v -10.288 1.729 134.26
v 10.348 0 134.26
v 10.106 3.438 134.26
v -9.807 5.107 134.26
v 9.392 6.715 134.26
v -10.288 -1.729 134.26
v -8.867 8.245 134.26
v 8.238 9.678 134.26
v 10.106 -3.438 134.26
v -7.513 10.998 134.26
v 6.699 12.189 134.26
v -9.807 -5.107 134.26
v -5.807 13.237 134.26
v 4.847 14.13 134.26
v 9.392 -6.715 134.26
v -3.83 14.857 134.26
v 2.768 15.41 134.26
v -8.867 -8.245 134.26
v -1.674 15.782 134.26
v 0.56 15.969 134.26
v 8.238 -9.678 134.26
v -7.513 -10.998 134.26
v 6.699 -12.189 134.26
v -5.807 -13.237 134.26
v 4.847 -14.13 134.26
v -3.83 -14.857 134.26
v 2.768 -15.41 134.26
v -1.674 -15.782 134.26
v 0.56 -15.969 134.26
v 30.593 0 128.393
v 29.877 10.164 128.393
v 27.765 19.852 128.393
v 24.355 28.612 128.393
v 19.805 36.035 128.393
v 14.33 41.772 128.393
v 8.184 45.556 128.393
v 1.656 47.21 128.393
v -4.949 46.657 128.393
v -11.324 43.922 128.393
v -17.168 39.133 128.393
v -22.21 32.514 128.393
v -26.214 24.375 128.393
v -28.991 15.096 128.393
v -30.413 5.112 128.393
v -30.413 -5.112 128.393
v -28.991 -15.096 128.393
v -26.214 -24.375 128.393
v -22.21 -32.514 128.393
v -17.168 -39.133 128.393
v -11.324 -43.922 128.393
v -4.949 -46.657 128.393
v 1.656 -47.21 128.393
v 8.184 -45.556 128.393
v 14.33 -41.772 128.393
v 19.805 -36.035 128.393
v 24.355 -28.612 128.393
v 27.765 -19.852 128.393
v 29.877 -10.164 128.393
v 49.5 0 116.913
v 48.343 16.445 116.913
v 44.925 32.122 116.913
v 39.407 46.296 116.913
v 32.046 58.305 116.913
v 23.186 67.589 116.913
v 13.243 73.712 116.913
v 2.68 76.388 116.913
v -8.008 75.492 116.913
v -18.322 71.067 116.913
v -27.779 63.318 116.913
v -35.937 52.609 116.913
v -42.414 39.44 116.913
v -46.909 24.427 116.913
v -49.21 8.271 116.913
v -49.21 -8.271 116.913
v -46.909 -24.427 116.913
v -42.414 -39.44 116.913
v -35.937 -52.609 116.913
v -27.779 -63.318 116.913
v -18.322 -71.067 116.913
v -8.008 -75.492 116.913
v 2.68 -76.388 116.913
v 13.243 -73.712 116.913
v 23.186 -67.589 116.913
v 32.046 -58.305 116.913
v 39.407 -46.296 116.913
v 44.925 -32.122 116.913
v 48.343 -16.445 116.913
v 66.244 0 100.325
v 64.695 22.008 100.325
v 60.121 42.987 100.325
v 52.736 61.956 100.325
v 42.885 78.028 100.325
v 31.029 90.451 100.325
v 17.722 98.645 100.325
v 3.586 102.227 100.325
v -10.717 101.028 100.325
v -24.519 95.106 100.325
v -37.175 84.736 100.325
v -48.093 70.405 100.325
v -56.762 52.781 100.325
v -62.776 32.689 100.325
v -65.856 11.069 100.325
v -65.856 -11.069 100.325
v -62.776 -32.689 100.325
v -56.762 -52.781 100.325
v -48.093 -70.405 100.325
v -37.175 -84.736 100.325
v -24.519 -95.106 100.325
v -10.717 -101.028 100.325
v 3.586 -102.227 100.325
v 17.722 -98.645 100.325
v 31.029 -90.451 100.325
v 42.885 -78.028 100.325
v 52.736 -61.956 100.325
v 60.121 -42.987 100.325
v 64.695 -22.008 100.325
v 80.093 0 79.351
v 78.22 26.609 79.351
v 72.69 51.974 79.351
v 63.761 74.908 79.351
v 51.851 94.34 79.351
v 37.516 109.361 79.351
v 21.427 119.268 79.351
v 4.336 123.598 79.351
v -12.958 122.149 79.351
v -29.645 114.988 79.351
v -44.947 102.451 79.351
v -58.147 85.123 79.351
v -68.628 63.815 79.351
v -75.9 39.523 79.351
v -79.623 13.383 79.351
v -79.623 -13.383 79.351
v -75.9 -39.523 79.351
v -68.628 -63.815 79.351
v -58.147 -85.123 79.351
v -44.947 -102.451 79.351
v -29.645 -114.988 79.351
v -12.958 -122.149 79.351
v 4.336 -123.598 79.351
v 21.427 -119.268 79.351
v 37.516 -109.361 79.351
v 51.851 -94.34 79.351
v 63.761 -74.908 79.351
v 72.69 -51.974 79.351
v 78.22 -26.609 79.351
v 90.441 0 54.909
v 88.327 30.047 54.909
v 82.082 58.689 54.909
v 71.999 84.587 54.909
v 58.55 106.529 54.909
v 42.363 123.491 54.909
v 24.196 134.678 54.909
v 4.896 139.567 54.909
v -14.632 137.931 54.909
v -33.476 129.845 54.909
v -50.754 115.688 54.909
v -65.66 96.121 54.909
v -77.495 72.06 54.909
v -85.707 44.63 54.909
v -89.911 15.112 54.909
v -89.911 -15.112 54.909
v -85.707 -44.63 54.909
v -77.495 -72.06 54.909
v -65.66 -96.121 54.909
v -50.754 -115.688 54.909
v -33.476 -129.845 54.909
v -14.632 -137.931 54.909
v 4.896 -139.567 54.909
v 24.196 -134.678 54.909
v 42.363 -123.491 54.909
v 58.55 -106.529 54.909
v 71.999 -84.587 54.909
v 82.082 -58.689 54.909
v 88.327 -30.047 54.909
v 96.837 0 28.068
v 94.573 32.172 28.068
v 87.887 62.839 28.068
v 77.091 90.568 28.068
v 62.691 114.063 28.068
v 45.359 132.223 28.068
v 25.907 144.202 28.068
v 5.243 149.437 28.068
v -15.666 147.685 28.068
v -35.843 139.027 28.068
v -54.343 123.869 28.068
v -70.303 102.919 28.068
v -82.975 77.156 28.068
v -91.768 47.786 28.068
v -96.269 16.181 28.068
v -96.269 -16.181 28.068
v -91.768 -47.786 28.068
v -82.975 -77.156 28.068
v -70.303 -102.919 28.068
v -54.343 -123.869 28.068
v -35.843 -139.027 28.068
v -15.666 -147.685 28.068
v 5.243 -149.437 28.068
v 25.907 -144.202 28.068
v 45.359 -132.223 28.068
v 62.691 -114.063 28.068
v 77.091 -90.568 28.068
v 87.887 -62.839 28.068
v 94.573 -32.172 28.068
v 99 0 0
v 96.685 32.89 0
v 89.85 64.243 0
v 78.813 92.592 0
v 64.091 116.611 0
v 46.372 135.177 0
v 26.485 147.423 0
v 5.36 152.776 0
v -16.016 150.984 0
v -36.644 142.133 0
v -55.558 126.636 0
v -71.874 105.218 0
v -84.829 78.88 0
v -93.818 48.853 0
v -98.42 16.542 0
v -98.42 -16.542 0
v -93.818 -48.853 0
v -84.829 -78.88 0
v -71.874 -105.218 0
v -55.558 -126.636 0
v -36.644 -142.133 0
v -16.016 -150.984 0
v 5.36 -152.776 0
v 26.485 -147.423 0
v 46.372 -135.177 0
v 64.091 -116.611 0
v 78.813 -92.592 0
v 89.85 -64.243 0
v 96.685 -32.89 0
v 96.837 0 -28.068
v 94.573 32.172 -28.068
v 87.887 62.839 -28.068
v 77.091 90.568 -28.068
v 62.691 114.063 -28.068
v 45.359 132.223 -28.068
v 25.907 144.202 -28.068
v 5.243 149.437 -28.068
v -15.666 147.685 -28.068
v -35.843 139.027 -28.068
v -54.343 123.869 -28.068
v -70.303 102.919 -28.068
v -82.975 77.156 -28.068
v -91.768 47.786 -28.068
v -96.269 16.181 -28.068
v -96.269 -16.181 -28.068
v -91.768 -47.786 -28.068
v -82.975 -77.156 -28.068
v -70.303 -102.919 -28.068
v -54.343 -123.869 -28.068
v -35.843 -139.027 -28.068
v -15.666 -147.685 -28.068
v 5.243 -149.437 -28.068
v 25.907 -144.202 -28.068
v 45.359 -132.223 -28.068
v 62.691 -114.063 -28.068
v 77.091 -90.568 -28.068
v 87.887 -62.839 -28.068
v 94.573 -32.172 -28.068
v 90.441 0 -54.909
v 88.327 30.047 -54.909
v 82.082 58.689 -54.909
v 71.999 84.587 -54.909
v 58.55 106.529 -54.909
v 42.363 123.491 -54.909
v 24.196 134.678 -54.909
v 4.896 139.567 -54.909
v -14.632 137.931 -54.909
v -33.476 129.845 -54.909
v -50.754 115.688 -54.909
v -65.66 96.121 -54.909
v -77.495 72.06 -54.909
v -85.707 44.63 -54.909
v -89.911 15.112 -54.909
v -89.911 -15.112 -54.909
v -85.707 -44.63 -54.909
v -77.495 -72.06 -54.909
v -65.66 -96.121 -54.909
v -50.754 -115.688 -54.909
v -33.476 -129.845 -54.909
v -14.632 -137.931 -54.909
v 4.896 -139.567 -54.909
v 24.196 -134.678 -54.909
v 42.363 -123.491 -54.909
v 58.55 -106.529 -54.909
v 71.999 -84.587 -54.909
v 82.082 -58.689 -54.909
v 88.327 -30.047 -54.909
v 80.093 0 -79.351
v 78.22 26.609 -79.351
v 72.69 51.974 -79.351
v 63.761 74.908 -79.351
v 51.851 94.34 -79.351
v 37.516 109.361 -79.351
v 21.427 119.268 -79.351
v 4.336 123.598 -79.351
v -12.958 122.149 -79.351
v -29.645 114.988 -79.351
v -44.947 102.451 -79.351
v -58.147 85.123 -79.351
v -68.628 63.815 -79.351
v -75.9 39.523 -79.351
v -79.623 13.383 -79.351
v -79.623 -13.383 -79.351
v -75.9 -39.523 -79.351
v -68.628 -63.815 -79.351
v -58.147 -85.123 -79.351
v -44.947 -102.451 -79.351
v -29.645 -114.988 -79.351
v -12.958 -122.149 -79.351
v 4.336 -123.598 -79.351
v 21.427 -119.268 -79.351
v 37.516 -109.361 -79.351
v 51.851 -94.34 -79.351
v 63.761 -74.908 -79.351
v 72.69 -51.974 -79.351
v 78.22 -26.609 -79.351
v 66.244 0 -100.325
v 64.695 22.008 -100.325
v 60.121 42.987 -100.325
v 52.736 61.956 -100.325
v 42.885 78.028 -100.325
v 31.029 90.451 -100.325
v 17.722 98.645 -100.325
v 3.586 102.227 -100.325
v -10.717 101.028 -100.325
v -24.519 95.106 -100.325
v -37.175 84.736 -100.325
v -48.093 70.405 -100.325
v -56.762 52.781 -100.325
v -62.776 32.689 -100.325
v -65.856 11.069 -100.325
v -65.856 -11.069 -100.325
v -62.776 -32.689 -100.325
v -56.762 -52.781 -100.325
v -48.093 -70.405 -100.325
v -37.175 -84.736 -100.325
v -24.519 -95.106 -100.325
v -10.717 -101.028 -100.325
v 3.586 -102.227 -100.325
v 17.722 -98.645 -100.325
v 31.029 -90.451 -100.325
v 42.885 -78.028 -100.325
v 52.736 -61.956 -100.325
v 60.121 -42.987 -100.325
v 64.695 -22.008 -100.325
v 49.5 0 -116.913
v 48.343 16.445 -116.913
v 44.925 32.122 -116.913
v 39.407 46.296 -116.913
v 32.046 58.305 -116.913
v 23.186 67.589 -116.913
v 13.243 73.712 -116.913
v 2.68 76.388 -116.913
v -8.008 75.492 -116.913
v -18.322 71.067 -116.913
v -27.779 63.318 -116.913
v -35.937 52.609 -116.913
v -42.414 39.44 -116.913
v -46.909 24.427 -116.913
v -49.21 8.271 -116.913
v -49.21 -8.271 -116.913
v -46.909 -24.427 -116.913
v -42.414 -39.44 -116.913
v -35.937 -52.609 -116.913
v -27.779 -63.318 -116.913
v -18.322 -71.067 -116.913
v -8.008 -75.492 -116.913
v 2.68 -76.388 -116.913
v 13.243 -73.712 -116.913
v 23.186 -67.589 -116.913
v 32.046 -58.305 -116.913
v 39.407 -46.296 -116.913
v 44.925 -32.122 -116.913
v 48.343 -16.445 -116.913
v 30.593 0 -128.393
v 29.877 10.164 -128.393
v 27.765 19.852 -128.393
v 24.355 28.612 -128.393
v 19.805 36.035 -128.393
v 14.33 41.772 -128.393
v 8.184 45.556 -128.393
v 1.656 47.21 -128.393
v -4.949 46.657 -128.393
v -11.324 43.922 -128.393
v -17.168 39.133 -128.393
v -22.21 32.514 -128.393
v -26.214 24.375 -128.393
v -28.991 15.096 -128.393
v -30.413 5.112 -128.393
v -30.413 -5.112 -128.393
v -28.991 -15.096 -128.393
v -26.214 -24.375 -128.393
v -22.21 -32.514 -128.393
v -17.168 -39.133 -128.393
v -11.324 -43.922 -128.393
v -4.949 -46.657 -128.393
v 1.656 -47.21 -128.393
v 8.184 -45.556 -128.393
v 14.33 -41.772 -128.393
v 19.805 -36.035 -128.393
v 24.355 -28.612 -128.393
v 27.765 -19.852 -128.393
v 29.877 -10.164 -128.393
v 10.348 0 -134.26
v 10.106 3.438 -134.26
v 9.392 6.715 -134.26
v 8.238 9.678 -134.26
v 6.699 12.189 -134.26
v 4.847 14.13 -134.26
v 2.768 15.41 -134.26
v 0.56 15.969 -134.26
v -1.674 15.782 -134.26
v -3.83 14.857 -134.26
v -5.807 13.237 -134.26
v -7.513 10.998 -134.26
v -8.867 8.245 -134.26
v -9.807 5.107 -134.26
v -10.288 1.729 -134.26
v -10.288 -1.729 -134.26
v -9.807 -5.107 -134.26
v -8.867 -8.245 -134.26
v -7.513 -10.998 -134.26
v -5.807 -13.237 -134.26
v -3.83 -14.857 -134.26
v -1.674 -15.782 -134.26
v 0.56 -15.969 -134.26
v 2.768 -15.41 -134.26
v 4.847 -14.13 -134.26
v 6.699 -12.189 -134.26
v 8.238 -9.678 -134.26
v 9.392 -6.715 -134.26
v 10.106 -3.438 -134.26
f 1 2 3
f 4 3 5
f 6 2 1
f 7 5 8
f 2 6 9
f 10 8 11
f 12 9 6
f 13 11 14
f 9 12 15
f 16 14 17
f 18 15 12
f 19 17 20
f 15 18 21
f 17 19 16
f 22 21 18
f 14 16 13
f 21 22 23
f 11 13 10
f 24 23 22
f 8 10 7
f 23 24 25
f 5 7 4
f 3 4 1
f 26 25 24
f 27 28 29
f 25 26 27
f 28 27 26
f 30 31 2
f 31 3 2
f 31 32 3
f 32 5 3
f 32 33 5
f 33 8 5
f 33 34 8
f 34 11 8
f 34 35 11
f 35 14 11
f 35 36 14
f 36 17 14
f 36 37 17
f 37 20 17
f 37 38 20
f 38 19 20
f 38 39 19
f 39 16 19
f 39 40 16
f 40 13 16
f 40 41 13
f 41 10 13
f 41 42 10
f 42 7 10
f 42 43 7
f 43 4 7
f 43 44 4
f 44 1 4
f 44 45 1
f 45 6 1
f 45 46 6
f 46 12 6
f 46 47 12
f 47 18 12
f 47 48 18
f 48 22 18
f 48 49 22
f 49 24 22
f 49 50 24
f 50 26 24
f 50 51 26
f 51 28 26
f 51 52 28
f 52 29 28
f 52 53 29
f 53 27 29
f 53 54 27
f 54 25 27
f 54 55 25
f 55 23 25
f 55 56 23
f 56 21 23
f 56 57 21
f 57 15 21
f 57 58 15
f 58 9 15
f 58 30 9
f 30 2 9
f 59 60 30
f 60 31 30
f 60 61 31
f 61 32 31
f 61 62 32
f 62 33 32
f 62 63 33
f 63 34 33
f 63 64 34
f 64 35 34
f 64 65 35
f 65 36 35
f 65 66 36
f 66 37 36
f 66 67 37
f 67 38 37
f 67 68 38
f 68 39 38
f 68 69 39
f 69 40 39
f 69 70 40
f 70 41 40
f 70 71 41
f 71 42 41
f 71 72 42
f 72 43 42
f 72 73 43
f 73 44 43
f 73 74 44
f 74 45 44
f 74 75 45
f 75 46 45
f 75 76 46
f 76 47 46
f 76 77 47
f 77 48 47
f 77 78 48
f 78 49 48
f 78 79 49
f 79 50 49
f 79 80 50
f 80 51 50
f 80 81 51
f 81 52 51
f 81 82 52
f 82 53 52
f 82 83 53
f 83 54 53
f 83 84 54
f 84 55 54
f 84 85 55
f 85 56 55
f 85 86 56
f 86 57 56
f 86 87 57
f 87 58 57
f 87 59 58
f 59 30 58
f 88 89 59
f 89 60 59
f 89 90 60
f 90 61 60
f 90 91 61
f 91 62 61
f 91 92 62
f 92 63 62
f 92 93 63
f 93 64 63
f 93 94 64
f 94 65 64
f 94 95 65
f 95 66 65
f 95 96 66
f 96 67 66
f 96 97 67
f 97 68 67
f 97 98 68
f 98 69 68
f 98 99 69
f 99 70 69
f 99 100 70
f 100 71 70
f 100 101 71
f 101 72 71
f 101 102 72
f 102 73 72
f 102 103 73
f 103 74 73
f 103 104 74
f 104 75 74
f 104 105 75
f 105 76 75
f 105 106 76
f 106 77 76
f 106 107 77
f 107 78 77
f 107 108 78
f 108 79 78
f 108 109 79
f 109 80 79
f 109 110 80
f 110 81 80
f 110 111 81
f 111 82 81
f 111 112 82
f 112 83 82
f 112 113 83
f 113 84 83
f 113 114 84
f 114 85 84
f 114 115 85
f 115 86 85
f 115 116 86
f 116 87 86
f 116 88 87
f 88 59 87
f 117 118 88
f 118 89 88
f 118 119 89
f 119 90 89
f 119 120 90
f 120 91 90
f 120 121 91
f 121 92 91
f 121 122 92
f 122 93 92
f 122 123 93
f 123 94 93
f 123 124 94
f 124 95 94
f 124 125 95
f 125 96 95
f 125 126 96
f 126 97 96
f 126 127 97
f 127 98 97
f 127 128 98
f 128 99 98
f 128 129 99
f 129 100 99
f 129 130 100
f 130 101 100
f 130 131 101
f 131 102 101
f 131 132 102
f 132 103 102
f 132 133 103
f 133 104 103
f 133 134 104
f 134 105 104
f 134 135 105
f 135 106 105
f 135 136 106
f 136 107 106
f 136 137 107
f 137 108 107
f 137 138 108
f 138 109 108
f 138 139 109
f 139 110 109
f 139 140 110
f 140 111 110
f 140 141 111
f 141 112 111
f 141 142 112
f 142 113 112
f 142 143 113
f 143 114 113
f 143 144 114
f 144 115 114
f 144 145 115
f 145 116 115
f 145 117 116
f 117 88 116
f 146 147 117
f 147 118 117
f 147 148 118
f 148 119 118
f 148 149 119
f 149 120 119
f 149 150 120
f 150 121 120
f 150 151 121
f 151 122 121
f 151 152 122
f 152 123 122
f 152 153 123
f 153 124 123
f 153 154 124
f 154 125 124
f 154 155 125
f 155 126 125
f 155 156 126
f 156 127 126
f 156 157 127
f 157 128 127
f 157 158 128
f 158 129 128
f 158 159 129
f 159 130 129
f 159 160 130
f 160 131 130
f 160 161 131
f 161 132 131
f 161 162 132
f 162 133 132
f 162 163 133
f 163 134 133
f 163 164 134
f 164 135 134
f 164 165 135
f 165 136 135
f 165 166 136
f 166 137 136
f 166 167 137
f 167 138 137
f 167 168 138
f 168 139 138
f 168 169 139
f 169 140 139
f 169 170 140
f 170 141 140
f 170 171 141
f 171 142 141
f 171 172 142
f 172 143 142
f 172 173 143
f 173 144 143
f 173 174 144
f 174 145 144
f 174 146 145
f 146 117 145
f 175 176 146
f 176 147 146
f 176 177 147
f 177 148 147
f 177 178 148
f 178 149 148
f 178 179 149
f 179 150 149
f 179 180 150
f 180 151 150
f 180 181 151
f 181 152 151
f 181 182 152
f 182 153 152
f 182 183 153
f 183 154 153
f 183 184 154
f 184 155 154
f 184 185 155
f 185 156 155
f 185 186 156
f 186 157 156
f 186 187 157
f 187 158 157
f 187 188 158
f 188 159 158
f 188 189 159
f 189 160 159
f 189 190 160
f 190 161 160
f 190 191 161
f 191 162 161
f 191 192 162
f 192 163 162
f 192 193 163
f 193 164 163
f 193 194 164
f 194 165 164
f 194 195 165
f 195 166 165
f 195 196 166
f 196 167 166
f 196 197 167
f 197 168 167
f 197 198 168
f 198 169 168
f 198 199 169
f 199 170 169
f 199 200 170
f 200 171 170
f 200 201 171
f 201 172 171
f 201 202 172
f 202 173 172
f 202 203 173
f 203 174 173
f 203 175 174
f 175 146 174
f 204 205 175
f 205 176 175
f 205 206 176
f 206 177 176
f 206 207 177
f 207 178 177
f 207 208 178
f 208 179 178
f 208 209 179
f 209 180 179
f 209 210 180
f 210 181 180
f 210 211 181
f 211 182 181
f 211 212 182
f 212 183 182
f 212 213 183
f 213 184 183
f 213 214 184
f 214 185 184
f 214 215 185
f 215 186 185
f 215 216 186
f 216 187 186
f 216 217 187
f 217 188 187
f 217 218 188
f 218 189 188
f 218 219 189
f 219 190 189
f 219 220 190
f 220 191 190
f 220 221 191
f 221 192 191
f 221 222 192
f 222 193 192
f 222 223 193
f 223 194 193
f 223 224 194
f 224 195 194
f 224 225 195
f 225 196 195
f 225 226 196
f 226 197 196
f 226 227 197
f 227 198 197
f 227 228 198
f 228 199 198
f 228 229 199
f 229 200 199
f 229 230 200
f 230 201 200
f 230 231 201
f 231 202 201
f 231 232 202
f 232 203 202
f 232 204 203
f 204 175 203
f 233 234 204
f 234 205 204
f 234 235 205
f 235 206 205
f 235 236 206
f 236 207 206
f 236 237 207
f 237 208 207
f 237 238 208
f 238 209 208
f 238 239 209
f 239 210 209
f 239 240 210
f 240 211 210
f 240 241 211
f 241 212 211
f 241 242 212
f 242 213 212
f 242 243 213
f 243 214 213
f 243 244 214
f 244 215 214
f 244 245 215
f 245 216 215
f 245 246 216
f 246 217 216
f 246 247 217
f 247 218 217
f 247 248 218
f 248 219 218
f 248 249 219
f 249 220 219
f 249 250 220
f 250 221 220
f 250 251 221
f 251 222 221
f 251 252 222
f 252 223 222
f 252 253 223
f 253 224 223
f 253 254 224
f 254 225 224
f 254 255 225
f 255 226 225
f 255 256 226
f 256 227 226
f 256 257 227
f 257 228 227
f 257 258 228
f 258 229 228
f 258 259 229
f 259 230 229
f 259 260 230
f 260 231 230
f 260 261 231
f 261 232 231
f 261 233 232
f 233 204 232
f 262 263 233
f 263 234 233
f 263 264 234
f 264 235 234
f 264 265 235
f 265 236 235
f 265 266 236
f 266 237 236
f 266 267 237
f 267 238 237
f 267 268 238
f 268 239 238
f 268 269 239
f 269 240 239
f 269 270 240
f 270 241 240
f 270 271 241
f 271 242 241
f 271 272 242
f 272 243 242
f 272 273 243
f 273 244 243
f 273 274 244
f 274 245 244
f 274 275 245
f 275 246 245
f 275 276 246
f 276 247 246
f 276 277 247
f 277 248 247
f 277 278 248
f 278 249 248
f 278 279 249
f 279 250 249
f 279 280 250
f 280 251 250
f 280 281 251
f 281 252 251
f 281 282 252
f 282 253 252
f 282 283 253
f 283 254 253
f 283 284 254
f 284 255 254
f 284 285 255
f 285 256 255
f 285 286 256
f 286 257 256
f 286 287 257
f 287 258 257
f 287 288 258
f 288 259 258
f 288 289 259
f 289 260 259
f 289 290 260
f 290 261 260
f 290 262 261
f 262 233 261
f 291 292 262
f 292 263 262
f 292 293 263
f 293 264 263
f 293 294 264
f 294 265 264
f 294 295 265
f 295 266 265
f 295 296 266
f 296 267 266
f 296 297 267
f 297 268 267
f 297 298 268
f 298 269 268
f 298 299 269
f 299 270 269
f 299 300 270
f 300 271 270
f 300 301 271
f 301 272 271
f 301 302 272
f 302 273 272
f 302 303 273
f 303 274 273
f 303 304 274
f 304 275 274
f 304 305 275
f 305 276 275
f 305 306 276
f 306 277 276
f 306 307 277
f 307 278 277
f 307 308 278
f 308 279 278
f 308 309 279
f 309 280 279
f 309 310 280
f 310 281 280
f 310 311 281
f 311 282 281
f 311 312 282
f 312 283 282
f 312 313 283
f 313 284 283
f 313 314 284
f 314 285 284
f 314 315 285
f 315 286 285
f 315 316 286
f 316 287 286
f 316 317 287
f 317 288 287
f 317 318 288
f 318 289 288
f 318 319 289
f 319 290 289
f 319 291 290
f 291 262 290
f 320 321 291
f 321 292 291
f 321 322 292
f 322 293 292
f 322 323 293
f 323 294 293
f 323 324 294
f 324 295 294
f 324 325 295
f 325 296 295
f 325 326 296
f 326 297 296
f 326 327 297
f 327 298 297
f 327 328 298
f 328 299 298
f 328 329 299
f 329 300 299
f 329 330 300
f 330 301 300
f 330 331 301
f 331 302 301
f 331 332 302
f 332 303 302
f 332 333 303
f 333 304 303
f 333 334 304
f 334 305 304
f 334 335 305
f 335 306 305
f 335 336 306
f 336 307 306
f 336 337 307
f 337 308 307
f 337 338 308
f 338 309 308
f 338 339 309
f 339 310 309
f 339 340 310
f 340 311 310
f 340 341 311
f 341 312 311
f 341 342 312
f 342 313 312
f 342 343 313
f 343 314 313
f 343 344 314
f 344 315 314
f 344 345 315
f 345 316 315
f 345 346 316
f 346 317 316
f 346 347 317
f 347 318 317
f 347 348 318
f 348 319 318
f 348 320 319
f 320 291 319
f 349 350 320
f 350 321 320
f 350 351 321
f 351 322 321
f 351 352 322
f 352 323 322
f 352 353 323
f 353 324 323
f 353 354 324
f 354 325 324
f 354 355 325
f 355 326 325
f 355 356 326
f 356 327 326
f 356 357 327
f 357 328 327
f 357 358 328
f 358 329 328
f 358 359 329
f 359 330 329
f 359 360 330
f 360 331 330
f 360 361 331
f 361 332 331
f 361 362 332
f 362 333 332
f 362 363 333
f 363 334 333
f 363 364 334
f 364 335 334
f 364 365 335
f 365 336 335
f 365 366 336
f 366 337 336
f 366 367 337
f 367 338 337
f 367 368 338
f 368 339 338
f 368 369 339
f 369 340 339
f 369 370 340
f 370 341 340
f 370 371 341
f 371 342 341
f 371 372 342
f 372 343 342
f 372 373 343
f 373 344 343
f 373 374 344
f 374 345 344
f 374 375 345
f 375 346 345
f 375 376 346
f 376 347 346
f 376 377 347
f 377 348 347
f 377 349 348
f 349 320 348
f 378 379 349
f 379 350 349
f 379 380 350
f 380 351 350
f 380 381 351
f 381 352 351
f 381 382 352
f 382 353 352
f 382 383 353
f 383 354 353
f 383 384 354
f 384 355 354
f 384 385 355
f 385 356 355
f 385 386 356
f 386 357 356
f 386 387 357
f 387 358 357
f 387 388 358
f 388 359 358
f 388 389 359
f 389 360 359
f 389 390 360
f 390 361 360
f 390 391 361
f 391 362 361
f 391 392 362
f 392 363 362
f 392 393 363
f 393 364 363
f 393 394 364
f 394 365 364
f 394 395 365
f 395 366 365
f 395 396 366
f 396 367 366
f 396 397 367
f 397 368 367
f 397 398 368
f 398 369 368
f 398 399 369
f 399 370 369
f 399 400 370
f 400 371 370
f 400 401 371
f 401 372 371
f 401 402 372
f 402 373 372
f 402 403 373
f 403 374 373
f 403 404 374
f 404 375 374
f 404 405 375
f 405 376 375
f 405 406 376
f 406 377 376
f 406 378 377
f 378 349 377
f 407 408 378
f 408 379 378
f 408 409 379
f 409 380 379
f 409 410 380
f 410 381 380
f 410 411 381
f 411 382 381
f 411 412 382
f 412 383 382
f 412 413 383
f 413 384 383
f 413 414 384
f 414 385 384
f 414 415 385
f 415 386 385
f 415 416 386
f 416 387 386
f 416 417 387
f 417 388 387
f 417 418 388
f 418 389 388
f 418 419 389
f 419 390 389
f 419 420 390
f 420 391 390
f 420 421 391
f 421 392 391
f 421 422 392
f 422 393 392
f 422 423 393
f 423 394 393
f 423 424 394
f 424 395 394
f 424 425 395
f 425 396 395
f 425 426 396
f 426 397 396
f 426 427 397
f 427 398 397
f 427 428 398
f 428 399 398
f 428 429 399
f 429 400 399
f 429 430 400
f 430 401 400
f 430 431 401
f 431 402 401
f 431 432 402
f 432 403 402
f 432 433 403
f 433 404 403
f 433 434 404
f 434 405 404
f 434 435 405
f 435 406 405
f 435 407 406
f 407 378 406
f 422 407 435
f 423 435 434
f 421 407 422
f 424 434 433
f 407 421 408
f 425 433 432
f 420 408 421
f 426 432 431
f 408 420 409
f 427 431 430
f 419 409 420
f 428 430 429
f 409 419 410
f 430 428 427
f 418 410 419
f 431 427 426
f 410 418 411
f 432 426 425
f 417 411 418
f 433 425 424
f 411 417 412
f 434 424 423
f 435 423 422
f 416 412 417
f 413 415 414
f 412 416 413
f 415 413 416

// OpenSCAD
// Generated by SolidPython 1.0.1 on 2020-07-29 00:46:50


scale(v = [11, 17, 15]) {
	sphere(r = 9);
}
/***********************************************
*********      SolidPython code:      **********
************************************************
 
# import packages: SolidPython
from solid import *
from solid.utils import *
from itertools import chain, combinations, permutations


class Resize:

    def __init__(self, scad_file):
        self.scad_file = scad_file
        #self.scad_file = import_scad(scad_file)
        # cone/cylinder param:
        self.r1 = 0
        self.r2 = 0
        self.h = 0
        # rectangular prism param:
        self.w = 0
        self.l = 0
        # ellipse param:
        self.r = 0

    # import OpenScad code (file name corresponds to shape)


    # classify shape + parameters
    def assign(self, param1, param2, param3):
        if self.scad_file == 'cone.scad':
            self.r1 = param1
            self.r2 = param2
            self.h = param3
        elif self.scad_file == 'cylinder.scad':
            self.r1 = param1
            self.r2 = param2
            self.h = param3
        elif self.scad_file == 'rectangularPrism.scad':
            self.h = param1
            self.l = param2
            self.w = param3
        else:
            self.r = param1
            self.h = param2

    # resize parameters
    def iterate(self):
        x = range(3, 20, 2)
        i = 1
        if self.scad_file == 'cone.scad':
            tempList = list(permutations(x, 2))
            for temp in tempList:
                param1 = temp[0]
                param2 = temp[1]
                filepath = 'produced_scad_files/' + 'cone' + str(param1) + '_' + str(param2) + '_' + '.scad'
                scad_render_to_file(cylinder(h=param1, r1=param2, r2=0), filepath)

        elif self.scad_file == 'cylinder.scad':
            tempList = list(permutations(x, 3))
            for temp in tempList:
                param1 = temp[0]
                param2 = temp[1]
                filepath = 'produced_scad_files/' + 'cylinder' + str(param1) + '_' + str(param2) + '_' + '.scad'
                scad_render_to_file(cylinder(h=param1, r1=param2, r2=param2), filepath)

        elif self.scad_file == 'rectangularPrism.scad':
            tempList = list(permutations(x, 3))
            for temp in tempList:
                param1 = temp[0]
                param2 = temp[1]
                param3 = temp[2]
                filepath = 'produced_scad_files/' + 'rectangularPrism' + str(param1) + '_' + str(param2) + '_' + str(
                    param3) + '.scad'
                scad_render_to_file(cube(size=(param1, param2, param3)), filepath)

        elif self.scad_file == 'ellipse.scad':
            tempList = list(permutations(x, 4))
            for temp in tempList:
                param1 = temp[0]
                param2 = temp[1]
                param3 = temp[2]
                param4 = temp[3]
                filepath = 'produced_scad_files/' + 'ellipse' + str(param1) + '_' + str(param2) + '_' + str(param3) + '_' + str(param4) + '.scad'
                scad_render_to_file(scale([param1, param2, param3])(sphere(r=param4)), filepath)

    def render_to_scadfile(self):
        scad_render_to_file(scad, 'example.scad') 
 
************************************************/
